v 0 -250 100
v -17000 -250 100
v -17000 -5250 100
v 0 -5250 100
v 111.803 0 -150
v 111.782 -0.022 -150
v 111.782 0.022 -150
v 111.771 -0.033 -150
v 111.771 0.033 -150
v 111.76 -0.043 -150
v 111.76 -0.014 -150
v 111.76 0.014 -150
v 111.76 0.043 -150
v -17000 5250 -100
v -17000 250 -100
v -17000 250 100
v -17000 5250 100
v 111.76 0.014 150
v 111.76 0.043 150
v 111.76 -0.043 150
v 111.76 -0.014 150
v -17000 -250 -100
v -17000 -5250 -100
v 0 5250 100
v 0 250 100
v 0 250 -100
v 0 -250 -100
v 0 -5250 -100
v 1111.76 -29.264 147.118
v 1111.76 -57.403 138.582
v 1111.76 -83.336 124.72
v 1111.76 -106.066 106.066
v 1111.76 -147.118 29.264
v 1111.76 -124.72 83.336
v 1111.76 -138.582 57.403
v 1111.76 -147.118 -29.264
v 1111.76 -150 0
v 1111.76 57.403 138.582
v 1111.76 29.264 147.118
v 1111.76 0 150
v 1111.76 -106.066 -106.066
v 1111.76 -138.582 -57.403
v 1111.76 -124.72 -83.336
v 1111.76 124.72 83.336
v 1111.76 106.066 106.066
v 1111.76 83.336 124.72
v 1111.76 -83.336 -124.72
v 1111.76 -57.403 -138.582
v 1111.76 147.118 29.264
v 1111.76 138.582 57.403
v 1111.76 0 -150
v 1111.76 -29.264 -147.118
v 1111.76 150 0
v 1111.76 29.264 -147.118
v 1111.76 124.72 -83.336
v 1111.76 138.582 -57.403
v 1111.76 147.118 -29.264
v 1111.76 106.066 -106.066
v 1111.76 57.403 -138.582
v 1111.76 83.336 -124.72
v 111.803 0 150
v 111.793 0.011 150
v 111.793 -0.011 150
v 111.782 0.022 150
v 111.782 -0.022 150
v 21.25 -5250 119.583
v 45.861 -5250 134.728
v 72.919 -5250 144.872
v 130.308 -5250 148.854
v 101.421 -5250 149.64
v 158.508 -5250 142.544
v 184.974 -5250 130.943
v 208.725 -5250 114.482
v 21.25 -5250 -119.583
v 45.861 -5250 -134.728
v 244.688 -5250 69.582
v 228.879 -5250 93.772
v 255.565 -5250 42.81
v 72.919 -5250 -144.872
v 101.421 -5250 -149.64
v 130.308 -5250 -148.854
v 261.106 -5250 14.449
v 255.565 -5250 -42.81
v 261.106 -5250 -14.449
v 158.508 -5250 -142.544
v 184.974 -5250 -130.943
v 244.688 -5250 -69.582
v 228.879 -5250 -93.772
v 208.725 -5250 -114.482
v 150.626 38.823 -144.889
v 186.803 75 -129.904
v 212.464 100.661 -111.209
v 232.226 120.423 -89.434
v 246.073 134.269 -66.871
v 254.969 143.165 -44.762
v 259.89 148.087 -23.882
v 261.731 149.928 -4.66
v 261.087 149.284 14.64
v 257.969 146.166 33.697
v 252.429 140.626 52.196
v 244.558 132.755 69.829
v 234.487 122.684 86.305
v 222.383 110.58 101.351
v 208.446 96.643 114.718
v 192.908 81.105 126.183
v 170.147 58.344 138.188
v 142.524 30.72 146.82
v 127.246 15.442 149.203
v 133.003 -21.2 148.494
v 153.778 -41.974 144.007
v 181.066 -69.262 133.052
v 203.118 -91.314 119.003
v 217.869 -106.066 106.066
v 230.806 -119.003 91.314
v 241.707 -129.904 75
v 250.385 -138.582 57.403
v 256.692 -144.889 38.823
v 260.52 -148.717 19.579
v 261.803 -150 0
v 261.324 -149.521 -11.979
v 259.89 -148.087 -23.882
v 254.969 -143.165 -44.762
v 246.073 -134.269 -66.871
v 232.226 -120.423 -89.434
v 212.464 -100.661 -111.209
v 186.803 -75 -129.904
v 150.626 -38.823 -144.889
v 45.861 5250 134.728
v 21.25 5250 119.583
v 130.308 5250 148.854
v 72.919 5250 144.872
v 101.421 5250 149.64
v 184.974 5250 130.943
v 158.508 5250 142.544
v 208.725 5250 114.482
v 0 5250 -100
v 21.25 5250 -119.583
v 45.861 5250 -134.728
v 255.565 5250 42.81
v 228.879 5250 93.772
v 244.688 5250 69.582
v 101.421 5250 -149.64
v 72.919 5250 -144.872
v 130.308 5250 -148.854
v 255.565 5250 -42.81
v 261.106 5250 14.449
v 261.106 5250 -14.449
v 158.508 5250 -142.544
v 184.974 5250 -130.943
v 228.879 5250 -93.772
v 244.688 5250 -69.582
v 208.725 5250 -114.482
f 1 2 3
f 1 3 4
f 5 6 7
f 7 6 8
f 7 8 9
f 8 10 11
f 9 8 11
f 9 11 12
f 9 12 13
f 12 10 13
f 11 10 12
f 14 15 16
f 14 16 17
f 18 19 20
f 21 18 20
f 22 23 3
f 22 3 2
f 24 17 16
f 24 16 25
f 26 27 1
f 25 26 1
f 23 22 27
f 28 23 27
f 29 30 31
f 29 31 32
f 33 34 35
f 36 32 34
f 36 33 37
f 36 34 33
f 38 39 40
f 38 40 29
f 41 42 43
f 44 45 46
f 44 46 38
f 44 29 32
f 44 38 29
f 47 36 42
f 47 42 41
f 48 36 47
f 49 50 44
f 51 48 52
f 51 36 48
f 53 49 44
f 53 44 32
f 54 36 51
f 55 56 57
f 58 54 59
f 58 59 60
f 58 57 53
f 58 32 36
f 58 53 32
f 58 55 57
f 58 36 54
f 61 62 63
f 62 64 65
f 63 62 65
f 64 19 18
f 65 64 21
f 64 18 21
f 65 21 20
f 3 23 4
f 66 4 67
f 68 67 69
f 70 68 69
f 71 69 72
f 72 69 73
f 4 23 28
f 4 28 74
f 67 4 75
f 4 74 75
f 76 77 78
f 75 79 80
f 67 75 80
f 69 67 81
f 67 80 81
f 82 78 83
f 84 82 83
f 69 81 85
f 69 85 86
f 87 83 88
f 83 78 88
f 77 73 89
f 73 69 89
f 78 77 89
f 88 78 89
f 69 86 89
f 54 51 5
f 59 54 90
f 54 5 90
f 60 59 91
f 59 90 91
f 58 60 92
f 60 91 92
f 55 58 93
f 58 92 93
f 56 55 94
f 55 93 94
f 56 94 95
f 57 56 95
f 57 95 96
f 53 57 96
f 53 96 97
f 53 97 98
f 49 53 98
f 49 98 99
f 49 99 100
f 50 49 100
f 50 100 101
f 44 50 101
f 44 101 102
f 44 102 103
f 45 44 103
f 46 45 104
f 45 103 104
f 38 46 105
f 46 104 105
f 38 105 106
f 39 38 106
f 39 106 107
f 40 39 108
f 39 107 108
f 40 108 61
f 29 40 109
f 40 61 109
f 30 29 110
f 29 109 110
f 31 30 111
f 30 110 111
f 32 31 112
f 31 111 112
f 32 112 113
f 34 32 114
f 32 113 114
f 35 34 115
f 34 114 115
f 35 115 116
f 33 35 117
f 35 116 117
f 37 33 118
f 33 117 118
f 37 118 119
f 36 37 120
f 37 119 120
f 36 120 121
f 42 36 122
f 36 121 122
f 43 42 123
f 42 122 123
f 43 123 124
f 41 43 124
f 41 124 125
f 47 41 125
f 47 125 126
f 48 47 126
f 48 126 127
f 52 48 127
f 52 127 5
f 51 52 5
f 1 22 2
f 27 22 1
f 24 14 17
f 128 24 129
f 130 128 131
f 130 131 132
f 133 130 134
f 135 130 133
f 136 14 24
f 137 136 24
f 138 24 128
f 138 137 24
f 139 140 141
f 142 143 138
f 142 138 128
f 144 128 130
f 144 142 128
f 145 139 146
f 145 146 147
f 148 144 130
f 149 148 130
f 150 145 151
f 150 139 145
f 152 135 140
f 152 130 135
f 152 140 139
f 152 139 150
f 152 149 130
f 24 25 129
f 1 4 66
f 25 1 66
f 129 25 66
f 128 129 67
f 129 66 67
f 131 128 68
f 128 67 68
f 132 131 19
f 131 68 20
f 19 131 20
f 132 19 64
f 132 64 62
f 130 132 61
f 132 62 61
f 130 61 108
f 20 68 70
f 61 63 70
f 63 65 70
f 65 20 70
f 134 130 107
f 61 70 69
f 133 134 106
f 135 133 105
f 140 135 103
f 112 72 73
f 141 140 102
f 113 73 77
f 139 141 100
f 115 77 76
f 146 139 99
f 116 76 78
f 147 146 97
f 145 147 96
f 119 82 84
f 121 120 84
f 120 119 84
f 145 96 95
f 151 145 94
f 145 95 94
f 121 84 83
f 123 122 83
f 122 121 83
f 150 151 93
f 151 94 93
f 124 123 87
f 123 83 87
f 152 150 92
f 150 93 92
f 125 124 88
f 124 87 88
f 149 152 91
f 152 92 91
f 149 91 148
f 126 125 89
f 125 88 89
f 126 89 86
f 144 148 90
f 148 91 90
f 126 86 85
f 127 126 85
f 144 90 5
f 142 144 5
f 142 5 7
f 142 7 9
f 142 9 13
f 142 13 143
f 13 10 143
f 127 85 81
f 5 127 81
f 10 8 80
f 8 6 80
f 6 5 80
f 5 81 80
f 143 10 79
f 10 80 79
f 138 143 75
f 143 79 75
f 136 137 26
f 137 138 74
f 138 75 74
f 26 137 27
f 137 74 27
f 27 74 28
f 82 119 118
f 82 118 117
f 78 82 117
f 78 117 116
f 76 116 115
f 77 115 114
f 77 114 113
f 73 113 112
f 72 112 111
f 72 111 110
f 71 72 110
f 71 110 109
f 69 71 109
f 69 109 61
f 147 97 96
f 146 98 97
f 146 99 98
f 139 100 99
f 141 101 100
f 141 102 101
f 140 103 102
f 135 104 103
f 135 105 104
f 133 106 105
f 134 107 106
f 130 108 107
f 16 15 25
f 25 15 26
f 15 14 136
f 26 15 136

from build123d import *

# Parameters (mm, degrees)
BOSS_EXTRUDE1_DEPTH        = 100
BOSS_EXTRUDE1_DEPTH_BACK   = 100
SKETCH2_W                  = 17000
SKETCH2_H                  = 5000
BOSS_EXTRUDE1_2_DEPTH      = 100
BOSS_EXTRUDE1_2_DEPTH_BACK = 100
BOSS_EXTRUDE2_DEPTH        = 5250
BOSS_EXTRUDE2_DEPTH_BACK   = 5250
BOSS_EXTRUDE3_START        = 111.76
SKETCH5_R                  = 150
BOSS_EXTRUDE3_DEPTH        = 1000


with BuildPart() as part:
    # Sketch2 → Boss-Extrude1 (new, two sides: drawn at the far end of the back side and taken through both)
    with BuildSketch(Plane.XY.offset(-BOSS_EXTRUDE1_DEPTH_BACK)):
        with Locations((-8500, -2750)):
            Rectangle(SKETCH2_W, SKETCH2_H)
    extrude(amount=BOSS_EXTRUDE1_DEPTH + BOSS_EXTRUDE1_DEPTH_BACK)



with BuildPart() as body_2:
    # Sketch2 → Boss-Extrude1 2 (new, two sides: drawn at the far end of the back side and taken through both)
    with BuildSketch(Plane.XY.offset(-BOSS_EXTRUDE1_2_DEPTH_BACK)):
        with Locations((-8500, 2750)):
            Rectangle(SKETCH2_W, SKETCH2_H)
    extrude(amount=BOSS_EXTRUDE1_2_DEPTH + BOSS_EXTRUDE1_2_DEPTH_BACK)


with BuildPart() as part_1:
    add(part.part)

    add(body_2.part)  # Boss-Extrude2 merges body 2
    # Sketch4 → Boss-Extrude2 (add, two sides: drawn at the far end of the back side and taken through both)
    with BuildSketch(Plane(origin=(0, 0, 0), x_dir=(1, 0, 0), z_dir=(0, 1, 0)).offset(-BOSS_EXTRUDE2_DEPTH_BACK)):
        with BuildLine():
            Line((0, 100), (0, -100))
            ThreePointArc((0, -100), (261.803398875, 0), (0, 100))
        make_face()
    extrude(amount=BOSS_EXTRUDE2_DEPTH + BOSS_EXTRUDE2_DEPTH_BACK)

    # Sketch5 → Boss-Extrude3 (add)
    with BuildSketch(Plane(origin=(0, 0, 0), x_dir=(0, 0, -1), z_dir=(1, 0, 0)).offset(BOSS_EXTRUDE3_START)):
        Circle(SKETCH5_R)
    extrude(amount=BOSS_EXTRUDE3_DEPTH)


solid = part_1.part
